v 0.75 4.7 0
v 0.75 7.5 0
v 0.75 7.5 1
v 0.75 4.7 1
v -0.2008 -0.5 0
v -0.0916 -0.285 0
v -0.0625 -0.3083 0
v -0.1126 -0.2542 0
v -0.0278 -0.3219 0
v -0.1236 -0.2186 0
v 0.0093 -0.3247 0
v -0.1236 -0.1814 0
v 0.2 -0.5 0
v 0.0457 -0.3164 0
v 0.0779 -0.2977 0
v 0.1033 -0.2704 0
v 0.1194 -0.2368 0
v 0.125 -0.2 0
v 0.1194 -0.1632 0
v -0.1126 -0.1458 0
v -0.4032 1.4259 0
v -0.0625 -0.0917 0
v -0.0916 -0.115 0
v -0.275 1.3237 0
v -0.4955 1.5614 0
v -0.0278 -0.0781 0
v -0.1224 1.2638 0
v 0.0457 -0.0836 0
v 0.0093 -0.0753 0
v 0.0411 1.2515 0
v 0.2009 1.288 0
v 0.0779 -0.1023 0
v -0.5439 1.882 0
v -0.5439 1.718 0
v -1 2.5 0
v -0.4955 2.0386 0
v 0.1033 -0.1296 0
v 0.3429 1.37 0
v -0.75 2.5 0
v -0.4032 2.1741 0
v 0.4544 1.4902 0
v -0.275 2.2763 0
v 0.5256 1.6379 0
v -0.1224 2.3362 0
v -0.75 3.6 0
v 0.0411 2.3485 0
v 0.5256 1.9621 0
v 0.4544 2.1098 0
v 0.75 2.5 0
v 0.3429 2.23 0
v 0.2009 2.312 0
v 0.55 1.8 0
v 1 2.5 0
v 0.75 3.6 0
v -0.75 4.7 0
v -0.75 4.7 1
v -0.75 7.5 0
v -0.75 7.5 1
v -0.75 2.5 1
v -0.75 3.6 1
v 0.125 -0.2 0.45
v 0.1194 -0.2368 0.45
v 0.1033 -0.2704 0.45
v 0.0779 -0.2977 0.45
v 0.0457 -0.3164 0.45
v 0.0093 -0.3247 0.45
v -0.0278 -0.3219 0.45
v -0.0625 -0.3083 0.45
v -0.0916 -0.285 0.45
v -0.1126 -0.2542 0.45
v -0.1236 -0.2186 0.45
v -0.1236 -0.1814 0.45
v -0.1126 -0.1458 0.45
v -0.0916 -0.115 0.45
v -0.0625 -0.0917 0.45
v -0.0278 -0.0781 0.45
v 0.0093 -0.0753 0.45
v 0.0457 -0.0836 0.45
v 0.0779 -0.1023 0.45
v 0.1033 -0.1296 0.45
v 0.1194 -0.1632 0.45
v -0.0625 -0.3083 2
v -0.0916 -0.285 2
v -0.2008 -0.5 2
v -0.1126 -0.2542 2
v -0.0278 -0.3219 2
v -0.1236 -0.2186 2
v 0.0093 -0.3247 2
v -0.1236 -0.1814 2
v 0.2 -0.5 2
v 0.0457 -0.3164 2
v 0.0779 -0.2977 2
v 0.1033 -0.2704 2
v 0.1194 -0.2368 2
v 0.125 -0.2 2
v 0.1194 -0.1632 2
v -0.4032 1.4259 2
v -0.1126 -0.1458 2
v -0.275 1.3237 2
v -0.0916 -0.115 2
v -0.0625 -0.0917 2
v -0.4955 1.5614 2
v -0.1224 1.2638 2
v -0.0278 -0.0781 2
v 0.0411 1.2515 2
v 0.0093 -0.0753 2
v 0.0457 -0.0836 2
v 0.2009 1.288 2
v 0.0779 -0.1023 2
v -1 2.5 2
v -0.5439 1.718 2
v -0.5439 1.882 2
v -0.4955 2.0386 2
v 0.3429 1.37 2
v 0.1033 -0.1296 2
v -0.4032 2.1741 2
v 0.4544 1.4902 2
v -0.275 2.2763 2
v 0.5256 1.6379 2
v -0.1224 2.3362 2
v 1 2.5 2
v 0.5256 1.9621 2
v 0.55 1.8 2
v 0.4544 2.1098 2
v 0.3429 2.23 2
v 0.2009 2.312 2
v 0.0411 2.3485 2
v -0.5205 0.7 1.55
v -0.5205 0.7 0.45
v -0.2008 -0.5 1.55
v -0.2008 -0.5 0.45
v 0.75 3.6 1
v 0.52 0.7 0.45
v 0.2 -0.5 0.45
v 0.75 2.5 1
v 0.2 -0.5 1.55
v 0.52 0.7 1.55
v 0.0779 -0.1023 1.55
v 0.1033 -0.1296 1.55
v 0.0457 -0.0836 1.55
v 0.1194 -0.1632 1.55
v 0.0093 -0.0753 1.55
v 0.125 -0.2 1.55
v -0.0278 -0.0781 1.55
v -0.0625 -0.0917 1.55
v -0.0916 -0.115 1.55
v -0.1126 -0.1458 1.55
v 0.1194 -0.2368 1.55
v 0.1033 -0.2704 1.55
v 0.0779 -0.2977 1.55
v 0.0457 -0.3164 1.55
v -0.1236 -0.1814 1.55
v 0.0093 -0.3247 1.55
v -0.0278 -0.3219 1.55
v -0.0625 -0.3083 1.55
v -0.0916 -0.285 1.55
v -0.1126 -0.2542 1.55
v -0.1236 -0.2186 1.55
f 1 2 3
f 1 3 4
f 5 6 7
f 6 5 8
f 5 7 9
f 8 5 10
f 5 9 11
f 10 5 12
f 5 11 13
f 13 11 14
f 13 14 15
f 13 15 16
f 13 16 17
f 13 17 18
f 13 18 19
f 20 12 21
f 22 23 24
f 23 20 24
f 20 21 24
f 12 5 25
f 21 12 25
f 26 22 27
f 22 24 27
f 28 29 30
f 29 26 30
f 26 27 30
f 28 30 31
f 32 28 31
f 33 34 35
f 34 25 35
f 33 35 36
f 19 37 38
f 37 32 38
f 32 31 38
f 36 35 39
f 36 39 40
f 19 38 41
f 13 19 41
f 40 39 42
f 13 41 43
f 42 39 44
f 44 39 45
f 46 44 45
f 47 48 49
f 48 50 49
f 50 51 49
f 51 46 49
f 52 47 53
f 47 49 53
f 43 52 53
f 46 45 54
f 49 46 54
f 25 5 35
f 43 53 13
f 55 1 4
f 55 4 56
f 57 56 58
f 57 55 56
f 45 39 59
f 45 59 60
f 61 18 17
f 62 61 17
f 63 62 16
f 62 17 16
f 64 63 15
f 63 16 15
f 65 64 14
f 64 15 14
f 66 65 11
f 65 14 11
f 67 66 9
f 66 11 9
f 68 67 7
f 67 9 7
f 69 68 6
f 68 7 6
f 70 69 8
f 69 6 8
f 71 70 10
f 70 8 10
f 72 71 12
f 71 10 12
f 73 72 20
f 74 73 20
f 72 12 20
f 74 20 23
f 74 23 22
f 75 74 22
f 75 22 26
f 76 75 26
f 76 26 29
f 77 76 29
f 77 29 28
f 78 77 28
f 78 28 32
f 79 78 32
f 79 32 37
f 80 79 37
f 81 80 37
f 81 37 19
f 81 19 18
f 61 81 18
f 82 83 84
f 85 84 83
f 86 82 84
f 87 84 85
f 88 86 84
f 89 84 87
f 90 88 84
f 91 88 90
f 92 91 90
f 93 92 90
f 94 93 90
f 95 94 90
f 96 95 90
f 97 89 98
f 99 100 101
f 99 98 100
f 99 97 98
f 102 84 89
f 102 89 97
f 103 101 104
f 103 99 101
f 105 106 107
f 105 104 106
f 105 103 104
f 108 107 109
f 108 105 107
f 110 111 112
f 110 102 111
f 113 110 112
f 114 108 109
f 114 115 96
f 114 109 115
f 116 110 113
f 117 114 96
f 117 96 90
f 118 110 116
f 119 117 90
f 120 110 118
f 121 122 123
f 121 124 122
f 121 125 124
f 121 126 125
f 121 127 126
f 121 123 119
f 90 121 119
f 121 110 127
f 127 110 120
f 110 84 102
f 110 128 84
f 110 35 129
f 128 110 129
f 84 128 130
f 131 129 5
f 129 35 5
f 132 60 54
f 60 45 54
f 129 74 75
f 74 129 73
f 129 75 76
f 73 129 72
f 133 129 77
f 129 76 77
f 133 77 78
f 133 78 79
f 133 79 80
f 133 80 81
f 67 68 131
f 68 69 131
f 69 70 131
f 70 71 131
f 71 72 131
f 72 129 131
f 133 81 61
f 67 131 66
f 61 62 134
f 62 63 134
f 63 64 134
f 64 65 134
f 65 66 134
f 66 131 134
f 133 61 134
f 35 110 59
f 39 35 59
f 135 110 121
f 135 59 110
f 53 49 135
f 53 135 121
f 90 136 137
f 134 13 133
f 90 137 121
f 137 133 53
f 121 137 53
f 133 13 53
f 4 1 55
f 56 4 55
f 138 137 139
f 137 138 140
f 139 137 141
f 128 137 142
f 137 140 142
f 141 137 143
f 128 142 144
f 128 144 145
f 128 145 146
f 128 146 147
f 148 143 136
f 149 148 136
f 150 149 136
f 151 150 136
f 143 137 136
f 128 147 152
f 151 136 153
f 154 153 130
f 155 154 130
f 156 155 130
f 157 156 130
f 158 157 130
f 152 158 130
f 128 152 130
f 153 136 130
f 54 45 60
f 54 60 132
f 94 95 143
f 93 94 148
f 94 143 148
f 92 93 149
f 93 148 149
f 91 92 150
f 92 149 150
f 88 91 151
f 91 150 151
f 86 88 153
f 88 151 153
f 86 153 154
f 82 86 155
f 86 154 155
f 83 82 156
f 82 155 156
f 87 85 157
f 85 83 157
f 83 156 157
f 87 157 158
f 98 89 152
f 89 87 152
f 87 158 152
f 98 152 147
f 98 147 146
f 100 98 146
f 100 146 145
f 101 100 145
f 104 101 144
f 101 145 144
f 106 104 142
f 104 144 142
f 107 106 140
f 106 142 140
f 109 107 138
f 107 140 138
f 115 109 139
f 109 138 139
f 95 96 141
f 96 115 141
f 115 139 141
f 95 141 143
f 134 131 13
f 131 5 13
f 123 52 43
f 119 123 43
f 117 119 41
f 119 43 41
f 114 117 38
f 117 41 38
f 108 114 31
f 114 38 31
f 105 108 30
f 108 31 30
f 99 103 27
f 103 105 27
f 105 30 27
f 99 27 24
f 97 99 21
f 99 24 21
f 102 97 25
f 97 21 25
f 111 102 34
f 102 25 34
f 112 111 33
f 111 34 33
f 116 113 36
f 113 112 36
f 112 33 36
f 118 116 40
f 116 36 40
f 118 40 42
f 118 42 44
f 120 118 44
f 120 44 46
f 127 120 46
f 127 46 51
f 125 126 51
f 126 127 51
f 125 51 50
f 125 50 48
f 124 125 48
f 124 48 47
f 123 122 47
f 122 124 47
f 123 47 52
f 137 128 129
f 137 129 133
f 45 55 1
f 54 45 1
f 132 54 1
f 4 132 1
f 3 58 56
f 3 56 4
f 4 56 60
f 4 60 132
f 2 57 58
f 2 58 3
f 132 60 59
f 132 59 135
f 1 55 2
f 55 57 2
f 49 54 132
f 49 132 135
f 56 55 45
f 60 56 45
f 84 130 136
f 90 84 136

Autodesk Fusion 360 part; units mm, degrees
sketch "Sketch1" plane through (0, 0, 0) normal (0, 0, 1) x (1, 0, 0) in component "Component"
  line L0 (0, 0) -> (1, 0) construction
  line L1 (1, 0) -> (1, 2.5) construction
  line L2 (-1, 2.5) -> (-1, -0.5) construction
  line L3 (-1, -0.5) -> (1, -0.5) construction
  line L4 (1, -0.5) -> (1, 2.5) construction
  circle A0 centre (0, -0.2) radius 0.125
  line L5 (-1, 2.5) -> (-0.2008, -0.5)
  line L6 (-0.2008, -0.5) -> (0.2, -0.5)
  line L7 (0.2, -0.5) -> (1, 2.5)
  line L8 (-1, 2.5) -> (1, 2.5)
  line L9 (-0.3, 1.1) -> (0.3, 1.1) construction
  line L10 (-0.75, 2.5) -> (-0.75, 3.6)
  line L11 (-0.75, 3.6) -> (0.75, 3.6)
  line L12 (0.75, 3.6) -> (0.75, 2.5)
  line L13 (-0.75, 3.6) -> (0.75, 3.6)
  line L14 (0.75, 3.6) -> (0.75, 4.7)
  line L15 (0.75, 4.7) -> (-0.75, 4.7)
  line L16 (-0.75, 4.7) -> (-0.75, 3.6)
  line L17 (0.75, 4.7) -> (-0.75, 4.7)
  line L18 (-0.75, 4.7) -> (-0.75, 7.5)
  line L19 (-0.75, 7.5) -> (0.75, 7.5)
  line L20 (0.75, 7.5) -> (0.75, 4.7)
  circle A1 centre (0, 1.8) radius 0.55
  dimension "d1" = 1
  dimension "d3" = 2
  dimension "d4" = 3
  dimension "d5" = 0.25
  dimension "d19" = 1.1
extrude "Extrude1" add sketch "Sketch1" along normal blind 2 contours L5 L6 L7 L8 makes body 1 in component "Component"
extrude "Extrude2" add sketch "Sketch1" along normal blind 1 contours L8 L10 L11 L12 L13 bodies 1 in component "Component"
extrude "Extrude3" add sketch "Sketch1" along normal blind 1 separate body contours L11 L13 L14 L15 L16 L17 makes body 2 in component "Component"
extrude "Extrude4" add sketch "Sketch1" along normal blind 1 separate body contours L15 L17 L18 L19 L20 makes body 3 in component "Component"
sketch "Sketch2" plane through (0, -0.5, 0) normal (0, -1, 0) x (1, 0, 0) in component "Component"
  line L0 (-0.2008, 0) -> (0.2, 0)
  line L1 (0.2, 0) -> (0.2, 2)
  line L2 (0.2, 2) -> (-0.2008, 2)
  line L3 (-0.2008, 2) -> (-0.2008, 0)
  line L4 (1.4, 1.55) -> (-1.4, 1.55)
  line L5 (-1.4, 1.55) -> (-1.4, 0.45)
  line L6 (-1.4, 0.45) -> (1.4, 0.45)
  line L7 (1.4, 0.45) -> (1.4, 1.55)
  line L8 (1.4, 1.55) -> (-1.4, 0.45) construction
  line L9 (-1.4, 1.55) -> (1.4, 0.45) construction
  point P0 (0, 1)
  dimension "d16" = 1.1
extrude "Extrude5" cut sketch "Sketch2" against normal blind 1.2 contours L3 L4 L5 L6 | L1 L3 L4 L6 | L1 L4 L6 L7 bodies 1 in component "Component"
component "Component" placed x (1, 0, 0) y (0, 1, 0) z (0, 0, 1) at (0, 0, 0)
